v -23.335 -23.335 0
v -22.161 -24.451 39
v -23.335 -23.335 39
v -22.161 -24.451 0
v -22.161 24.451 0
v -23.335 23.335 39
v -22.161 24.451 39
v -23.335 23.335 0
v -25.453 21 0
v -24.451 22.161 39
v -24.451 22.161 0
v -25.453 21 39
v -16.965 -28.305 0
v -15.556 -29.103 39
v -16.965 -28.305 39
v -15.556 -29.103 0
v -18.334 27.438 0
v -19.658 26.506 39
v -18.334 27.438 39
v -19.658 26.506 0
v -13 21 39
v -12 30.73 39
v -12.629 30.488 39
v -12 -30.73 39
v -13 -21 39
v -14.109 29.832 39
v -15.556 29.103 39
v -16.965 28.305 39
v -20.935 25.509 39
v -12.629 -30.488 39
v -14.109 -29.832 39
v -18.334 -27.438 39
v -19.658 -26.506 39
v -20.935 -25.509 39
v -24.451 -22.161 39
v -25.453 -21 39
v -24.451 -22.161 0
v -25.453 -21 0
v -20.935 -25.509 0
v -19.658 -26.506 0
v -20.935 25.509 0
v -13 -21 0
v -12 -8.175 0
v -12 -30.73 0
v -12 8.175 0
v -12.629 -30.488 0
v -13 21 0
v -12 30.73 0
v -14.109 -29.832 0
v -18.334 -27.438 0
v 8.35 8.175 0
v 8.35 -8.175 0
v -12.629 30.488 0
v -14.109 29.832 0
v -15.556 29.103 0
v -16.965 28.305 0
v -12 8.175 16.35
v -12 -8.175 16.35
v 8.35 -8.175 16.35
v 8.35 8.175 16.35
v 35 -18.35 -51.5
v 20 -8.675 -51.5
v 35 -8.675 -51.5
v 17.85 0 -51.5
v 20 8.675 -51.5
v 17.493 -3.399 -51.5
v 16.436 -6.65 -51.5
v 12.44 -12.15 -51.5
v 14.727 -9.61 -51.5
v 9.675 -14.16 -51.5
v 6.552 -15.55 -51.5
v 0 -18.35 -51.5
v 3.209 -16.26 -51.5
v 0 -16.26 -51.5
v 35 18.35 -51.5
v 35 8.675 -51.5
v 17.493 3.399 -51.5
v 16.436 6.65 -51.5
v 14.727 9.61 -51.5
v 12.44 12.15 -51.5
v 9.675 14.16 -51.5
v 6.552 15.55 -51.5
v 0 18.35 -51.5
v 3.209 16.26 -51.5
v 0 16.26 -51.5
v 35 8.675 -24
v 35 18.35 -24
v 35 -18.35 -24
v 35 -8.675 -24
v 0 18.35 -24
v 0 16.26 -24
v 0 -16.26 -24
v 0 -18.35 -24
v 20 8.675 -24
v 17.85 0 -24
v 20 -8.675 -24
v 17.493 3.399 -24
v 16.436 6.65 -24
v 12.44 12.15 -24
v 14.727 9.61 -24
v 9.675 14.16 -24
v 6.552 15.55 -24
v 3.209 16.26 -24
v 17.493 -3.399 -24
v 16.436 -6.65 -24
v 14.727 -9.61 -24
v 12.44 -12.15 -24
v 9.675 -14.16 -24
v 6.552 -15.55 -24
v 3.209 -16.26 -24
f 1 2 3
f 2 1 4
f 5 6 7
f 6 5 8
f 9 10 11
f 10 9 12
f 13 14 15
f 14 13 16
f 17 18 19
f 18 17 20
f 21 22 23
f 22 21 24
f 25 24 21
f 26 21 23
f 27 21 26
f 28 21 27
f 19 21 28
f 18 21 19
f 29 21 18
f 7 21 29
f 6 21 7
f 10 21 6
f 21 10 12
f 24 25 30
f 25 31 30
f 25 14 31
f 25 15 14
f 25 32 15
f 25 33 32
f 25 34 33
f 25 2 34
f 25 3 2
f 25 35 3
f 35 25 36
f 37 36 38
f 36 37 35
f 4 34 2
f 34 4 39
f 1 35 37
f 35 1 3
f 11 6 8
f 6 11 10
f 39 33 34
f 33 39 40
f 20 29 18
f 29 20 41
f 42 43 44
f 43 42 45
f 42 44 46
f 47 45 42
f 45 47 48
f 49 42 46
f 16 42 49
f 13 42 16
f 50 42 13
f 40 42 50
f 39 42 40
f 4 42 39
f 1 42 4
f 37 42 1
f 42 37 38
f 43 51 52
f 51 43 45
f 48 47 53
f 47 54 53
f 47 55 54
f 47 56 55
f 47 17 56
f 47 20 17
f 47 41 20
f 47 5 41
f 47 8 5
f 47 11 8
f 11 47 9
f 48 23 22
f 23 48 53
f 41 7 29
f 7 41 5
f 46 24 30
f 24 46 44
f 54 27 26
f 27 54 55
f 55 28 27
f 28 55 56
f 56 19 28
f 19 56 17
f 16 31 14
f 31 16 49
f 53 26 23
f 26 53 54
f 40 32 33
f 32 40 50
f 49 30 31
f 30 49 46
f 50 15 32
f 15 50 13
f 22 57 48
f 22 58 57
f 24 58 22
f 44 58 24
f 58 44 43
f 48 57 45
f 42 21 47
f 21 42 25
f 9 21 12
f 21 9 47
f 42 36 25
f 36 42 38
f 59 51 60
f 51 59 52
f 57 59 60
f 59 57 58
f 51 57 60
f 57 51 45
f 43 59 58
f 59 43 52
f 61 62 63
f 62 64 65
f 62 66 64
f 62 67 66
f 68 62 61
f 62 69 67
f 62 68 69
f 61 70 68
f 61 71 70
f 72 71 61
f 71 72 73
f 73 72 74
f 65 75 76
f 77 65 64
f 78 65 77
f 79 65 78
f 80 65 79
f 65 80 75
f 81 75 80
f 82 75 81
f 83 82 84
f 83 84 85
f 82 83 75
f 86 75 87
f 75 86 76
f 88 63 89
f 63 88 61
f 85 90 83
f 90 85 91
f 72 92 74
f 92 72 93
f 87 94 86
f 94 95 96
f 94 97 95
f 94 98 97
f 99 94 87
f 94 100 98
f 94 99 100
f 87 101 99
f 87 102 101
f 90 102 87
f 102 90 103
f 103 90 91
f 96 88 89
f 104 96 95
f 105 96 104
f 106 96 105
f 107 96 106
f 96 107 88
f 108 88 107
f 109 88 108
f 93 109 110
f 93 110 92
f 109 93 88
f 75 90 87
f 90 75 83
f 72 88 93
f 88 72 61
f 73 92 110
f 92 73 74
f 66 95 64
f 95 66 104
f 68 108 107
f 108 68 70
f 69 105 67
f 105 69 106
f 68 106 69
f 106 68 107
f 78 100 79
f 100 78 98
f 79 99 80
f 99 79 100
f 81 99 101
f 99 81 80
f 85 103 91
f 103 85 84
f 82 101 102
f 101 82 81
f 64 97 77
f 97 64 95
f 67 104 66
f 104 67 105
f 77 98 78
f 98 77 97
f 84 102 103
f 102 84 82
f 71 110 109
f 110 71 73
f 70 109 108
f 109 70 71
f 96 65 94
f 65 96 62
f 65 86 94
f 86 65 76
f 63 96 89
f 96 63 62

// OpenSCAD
id = 66;
bd = 32.7;

gapd = 42;
gaph = 20;
stack_h = 27.5;

to_back_plate = 35;
half_casting = 36;

block = bd/2;  
lip = 3;  


base();



translate([0,0,-half_casting]) rotate ([0,90,0] )holder();

module base() { 
 offset = half_casting + lip;
 
    
    difference() {
  cylinder(h = offset, d = id, $fn = 128);
  translate([-12,-id/2,-1]) cube(81);
  translate([-id/2,-gapd/2,-1]) cube([gaph,  gapd, offset + 10]);  

   
}
  translate([-12,-block/2,0]) cube([block+4,block,block]);
}



module holder() {
l = to_back_plate;    
    
difference() {
translate ([-12, -(bd + 4)/2, 0]) cube( [stack_h, bd + 4, l] );
translate([-13,0,lip/2]) rotate([0,90,0]) cylinder( d = bd, h = 30);

translate([-13,-(block+1)/2,20]) cube([bd,block+1,bd+10]);
}


}
    
